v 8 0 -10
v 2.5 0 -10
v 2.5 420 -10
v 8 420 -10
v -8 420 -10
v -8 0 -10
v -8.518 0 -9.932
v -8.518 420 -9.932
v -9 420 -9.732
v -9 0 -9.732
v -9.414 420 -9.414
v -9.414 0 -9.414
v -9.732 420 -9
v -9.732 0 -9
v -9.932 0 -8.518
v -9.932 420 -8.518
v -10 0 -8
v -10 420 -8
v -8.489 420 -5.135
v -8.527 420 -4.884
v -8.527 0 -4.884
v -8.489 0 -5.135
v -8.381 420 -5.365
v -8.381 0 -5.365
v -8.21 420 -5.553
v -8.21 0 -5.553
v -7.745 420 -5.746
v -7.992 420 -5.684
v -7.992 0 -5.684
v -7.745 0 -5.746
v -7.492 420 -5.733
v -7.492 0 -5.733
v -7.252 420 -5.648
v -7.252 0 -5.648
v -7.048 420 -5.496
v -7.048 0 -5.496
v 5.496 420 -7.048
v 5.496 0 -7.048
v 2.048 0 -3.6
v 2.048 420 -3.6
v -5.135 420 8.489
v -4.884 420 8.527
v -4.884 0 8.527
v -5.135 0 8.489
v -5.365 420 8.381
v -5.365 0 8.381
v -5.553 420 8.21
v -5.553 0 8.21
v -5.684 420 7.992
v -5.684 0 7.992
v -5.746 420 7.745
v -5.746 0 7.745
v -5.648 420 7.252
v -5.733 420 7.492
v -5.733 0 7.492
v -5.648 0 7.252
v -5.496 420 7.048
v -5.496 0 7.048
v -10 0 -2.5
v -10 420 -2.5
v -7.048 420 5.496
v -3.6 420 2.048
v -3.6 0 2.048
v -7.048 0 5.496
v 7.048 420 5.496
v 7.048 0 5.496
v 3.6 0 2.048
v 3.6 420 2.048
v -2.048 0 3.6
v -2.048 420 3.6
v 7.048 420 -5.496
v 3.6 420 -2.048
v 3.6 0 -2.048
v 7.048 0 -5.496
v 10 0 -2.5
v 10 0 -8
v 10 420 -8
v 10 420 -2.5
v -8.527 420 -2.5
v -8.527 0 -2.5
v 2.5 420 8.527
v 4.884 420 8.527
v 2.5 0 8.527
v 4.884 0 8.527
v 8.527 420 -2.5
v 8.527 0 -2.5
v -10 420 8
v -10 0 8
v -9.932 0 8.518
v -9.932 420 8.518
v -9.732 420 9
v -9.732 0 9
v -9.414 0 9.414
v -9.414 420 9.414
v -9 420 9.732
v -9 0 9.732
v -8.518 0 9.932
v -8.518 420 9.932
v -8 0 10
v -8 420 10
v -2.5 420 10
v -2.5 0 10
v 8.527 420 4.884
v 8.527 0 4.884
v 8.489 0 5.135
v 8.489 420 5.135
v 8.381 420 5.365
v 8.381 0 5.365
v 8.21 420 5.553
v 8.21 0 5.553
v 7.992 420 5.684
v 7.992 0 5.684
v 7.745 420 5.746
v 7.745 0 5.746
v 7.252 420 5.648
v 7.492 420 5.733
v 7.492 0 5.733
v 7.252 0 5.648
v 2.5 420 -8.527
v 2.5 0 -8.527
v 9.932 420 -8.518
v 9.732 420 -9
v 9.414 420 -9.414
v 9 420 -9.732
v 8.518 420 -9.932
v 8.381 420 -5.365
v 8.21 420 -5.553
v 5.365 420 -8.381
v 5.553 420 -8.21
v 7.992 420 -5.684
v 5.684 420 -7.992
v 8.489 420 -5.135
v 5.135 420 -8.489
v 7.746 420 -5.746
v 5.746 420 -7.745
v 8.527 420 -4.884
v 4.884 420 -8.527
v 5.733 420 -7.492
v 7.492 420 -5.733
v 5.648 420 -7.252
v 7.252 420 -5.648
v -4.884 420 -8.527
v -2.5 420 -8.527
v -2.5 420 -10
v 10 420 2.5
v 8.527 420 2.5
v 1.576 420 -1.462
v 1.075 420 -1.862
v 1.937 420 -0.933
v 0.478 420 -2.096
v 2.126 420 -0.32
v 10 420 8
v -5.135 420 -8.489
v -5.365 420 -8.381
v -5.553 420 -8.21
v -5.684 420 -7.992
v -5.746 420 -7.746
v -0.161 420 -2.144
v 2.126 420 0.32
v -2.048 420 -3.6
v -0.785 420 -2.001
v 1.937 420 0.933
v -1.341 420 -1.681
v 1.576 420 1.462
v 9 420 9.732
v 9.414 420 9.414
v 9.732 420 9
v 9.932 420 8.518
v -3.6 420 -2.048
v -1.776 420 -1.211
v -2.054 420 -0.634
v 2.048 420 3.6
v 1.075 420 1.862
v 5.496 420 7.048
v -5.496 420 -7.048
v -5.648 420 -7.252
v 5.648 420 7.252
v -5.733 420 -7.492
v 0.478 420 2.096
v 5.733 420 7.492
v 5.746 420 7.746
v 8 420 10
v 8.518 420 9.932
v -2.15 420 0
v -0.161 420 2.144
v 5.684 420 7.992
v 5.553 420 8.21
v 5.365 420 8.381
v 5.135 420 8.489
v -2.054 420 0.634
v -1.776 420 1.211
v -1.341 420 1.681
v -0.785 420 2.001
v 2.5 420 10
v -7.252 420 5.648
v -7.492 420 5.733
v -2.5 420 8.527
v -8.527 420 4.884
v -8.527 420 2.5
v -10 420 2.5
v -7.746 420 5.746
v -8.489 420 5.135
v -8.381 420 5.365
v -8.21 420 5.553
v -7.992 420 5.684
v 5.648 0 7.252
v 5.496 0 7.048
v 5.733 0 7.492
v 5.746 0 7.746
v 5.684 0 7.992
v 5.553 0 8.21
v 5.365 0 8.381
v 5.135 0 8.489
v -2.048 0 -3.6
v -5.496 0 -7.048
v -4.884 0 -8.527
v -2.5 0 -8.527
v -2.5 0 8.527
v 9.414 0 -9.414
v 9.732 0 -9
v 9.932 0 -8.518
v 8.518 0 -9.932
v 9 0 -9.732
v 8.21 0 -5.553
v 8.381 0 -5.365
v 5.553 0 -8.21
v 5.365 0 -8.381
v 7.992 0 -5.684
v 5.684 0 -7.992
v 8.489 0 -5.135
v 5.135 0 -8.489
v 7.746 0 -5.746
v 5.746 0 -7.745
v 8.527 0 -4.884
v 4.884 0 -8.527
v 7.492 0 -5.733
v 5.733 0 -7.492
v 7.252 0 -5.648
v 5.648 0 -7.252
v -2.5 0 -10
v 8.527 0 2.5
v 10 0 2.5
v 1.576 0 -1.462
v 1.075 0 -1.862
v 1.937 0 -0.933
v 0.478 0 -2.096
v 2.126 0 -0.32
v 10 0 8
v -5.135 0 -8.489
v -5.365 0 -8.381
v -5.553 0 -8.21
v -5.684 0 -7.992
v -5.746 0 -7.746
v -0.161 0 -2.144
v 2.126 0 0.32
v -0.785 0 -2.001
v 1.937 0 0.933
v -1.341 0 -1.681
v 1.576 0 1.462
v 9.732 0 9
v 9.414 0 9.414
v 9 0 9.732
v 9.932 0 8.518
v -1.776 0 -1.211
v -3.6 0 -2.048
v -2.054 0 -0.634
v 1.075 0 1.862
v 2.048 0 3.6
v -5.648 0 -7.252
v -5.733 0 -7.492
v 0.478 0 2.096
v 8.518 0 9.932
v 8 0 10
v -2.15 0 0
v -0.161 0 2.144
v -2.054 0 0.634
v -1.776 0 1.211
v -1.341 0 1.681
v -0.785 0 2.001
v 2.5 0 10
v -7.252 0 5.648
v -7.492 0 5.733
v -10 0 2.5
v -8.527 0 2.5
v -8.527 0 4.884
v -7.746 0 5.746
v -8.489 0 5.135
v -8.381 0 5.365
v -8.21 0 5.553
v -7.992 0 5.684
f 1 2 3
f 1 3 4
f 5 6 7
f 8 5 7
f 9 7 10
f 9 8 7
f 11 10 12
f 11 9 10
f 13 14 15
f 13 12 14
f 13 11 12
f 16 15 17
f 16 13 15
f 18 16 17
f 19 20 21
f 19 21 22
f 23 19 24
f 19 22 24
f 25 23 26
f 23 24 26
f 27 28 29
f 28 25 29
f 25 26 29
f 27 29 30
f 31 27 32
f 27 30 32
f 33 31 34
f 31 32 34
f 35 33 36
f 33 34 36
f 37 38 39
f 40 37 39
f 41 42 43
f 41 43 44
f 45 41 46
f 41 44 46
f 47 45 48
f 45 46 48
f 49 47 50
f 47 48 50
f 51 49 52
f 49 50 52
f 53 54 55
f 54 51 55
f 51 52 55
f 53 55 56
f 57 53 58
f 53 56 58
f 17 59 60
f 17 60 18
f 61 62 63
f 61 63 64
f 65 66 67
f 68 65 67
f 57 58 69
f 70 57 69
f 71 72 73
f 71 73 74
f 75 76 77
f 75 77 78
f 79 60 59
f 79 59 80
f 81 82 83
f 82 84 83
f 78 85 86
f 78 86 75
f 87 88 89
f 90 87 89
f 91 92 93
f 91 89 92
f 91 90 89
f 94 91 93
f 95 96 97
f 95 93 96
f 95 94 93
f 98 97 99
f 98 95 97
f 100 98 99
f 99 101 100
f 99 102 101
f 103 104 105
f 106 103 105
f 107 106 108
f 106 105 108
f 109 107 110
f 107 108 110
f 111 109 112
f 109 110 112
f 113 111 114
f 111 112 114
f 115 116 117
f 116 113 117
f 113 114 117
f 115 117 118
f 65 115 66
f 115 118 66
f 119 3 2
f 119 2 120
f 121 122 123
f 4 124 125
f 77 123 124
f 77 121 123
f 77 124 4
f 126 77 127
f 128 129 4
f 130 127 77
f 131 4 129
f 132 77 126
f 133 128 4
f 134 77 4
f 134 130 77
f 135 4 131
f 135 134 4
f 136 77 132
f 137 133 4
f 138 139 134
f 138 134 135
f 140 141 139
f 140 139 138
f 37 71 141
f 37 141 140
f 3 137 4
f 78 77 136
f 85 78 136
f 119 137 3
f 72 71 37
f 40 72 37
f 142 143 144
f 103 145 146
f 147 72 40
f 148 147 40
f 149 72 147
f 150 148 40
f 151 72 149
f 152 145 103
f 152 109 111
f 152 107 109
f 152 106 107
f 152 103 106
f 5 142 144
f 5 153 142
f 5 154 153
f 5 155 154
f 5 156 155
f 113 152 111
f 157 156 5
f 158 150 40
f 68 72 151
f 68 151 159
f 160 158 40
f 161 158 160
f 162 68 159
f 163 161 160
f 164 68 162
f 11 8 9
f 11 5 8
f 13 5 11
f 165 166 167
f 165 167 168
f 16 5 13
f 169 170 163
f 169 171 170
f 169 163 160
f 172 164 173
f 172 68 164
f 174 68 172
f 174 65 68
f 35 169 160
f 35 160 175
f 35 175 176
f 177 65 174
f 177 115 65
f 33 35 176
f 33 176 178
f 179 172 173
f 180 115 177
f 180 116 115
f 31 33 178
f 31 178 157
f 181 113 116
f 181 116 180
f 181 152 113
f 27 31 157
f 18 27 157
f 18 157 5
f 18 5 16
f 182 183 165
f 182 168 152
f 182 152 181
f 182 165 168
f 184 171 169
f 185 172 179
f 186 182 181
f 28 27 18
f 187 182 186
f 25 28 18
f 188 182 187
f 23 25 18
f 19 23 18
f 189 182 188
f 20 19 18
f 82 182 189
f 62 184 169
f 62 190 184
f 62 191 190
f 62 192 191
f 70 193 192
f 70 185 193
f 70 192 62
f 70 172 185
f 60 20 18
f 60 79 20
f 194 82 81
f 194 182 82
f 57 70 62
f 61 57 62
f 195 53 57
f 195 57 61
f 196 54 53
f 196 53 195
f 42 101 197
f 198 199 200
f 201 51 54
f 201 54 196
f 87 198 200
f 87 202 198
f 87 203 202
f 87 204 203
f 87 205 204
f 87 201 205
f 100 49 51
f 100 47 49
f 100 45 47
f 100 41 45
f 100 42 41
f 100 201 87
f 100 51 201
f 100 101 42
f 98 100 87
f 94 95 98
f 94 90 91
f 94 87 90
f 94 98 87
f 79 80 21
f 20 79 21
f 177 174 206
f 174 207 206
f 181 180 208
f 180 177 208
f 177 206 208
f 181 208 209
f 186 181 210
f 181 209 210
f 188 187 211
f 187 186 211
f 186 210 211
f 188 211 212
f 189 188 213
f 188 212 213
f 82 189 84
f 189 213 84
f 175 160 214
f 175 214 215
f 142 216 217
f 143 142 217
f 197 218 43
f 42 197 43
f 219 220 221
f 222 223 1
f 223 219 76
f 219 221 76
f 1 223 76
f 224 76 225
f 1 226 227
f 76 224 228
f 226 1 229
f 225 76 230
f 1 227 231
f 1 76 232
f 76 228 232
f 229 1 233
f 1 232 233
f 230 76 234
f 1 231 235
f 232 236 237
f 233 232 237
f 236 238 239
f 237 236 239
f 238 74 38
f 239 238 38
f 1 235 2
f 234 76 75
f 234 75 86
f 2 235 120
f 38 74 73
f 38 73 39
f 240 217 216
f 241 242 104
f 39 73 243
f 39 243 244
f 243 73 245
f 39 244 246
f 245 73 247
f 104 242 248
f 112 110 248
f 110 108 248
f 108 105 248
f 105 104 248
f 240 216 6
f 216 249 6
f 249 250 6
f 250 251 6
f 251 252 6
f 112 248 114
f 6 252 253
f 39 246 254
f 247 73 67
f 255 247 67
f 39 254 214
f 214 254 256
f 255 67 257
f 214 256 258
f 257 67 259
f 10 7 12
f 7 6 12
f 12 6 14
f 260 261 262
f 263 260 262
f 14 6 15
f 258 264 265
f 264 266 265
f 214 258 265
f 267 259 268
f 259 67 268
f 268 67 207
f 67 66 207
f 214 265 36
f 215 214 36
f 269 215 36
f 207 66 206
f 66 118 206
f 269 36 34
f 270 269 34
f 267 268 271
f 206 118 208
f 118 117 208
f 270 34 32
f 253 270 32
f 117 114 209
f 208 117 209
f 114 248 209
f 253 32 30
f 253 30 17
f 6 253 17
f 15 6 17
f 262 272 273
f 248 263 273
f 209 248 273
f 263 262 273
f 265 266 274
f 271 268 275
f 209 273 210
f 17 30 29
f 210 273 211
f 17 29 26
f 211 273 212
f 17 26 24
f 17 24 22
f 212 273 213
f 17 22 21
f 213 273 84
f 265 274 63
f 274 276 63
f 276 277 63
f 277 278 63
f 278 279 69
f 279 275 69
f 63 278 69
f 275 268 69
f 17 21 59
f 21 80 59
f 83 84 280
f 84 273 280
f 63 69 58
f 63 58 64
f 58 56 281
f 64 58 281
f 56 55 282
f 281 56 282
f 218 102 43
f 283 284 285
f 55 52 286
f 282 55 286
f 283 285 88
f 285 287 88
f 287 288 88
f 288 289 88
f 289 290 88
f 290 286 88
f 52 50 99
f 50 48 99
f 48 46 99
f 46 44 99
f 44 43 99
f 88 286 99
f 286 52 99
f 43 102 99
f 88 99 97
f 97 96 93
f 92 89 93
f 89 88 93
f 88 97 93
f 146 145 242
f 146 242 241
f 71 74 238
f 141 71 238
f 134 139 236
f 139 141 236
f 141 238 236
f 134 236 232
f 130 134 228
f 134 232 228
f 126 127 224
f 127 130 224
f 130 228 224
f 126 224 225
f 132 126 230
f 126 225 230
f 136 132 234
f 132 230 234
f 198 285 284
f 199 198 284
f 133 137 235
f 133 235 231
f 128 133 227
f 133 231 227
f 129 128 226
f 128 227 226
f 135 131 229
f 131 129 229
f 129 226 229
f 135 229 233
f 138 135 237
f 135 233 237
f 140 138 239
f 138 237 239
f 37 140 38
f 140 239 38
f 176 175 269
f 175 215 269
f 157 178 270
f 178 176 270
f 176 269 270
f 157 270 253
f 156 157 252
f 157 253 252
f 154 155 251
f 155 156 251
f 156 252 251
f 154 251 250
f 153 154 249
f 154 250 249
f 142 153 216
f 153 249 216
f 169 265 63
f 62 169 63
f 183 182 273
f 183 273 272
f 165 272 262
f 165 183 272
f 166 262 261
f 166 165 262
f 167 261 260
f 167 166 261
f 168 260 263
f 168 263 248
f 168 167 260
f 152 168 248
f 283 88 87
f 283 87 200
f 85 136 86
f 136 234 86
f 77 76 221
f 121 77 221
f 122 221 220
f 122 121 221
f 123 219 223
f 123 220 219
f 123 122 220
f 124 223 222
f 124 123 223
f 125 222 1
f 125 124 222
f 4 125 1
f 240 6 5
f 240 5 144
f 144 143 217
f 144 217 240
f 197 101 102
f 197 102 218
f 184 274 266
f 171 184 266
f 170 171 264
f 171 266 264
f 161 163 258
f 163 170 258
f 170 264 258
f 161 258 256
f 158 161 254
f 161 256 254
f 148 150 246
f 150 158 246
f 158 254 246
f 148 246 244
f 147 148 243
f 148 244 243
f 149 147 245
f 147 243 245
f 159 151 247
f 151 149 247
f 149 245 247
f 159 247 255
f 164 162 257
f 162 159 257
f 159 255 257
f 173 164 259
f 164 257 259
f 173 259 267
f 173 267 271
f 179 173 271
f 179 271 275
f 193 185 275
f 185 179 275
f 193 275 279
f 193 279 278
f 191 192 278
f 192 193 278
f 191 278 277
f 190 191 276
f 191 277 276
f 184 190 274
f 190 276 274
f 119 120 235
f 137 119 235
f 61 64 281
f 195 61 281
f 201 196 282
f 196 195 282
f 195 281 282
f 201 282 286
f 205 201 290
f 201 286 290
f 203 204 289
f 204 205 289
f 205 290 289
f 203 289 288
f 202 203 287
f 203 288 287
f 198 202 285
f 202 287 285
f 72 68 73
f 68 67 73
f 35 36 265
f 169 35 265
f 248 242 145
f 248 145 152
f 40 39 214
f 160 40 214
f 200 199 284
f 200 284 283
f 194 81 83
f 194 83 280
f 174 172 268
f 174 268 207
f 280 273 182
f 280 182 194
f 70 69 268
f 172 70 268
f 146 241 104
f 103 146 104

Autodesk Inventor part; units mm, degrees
ref_plane "YZ Plane" through (0, 0, 0) normal (1, 0, 0) x (0, 1, 0)
ref_plane "XZ Plane" through (0, 0, 0) normal (0, 1, 0) x (-1, 0, 0)
ref_plane "XY Plane" through (0, 0, 0) normal (0, 0, 1) x (1, 0, 0)
sketch "Sketch1" plane through (0, 0, 0) normal (0, 1, 0) x (-1, 0, 0)
  circle A0 centre (0, 0) radius 2.15
  line L0 (-10, 10) -> (10, 10)
  line L1 (10, 10) -> (10, -10)
  line L2 (10, -10) -> (-10, -10)
  line L3 (-10, -10) -> (-10, 10)
  line L4 (-10, 10) -> (10, -10) construction
  line L5 (10, 10) -> (-10, -10) construction
  line L6 (10, -2.5) -> (8.5267, -2.5)
  line L7 (8.5267, -2.5) -> (8.5267, -4.8839)
  line L8 (7.0482, -5.4963) -> (3.6, -2.0481)
  line L9 (3.6, -2.0481) -> (3.6, 2.0481)
  line L10 (3.6, 2.0481) -> (7.0482, 5.4963)
  line L11 (8.5267, 4.8839) -> (8.5267, 2.5)
  line L12 (8.5267, 2.5) -> (10, 2.5)
  line L13 (0, 0) -> (10, 0) construction
  arc A1 (8.5267, 4.8839) -> (7.0482, 5.4963) centre (7.6606, 4.8839) ccw
  arc A2 (7.0482, -5.4963) -> (8.5267, -4.8839) centre (7.6606, -4.8839) ccw
  point P0 (8.5267, -6.9748)
  point P1 (8.5267, 6.9748)
  point P2 (3.6, 0)
  dimension "d0" = 4.3
  dimension "d1" = 20
  dimension "d2" = 20
  dimension "d3" = 5
  dimension "d4" = 6.4
  dimension "d14" = 11.5
extrude "Extrusion1" add sketch "Sketch1" along normal blind 420
extrude "Extrusion2" cut sketch "Sketch1" along normal blind 420 contours L1 L6 L7 A2 L8 L9 L10 A1 L11 L12
pattern_circular "Circular Pattern1" count 4 over 360 about axis through (0, -10, 0) along (0, 1, 0) of "Extrusion2"
fillet "Fillet1" radius 2 4 edges at (-10, 210, -10) (10, 210, -10) (10, 210, 10) (-10, 210, 10)
equation "\"d7\" = d5"
equation "\"d5\" = 420"
properties part number "8020"
